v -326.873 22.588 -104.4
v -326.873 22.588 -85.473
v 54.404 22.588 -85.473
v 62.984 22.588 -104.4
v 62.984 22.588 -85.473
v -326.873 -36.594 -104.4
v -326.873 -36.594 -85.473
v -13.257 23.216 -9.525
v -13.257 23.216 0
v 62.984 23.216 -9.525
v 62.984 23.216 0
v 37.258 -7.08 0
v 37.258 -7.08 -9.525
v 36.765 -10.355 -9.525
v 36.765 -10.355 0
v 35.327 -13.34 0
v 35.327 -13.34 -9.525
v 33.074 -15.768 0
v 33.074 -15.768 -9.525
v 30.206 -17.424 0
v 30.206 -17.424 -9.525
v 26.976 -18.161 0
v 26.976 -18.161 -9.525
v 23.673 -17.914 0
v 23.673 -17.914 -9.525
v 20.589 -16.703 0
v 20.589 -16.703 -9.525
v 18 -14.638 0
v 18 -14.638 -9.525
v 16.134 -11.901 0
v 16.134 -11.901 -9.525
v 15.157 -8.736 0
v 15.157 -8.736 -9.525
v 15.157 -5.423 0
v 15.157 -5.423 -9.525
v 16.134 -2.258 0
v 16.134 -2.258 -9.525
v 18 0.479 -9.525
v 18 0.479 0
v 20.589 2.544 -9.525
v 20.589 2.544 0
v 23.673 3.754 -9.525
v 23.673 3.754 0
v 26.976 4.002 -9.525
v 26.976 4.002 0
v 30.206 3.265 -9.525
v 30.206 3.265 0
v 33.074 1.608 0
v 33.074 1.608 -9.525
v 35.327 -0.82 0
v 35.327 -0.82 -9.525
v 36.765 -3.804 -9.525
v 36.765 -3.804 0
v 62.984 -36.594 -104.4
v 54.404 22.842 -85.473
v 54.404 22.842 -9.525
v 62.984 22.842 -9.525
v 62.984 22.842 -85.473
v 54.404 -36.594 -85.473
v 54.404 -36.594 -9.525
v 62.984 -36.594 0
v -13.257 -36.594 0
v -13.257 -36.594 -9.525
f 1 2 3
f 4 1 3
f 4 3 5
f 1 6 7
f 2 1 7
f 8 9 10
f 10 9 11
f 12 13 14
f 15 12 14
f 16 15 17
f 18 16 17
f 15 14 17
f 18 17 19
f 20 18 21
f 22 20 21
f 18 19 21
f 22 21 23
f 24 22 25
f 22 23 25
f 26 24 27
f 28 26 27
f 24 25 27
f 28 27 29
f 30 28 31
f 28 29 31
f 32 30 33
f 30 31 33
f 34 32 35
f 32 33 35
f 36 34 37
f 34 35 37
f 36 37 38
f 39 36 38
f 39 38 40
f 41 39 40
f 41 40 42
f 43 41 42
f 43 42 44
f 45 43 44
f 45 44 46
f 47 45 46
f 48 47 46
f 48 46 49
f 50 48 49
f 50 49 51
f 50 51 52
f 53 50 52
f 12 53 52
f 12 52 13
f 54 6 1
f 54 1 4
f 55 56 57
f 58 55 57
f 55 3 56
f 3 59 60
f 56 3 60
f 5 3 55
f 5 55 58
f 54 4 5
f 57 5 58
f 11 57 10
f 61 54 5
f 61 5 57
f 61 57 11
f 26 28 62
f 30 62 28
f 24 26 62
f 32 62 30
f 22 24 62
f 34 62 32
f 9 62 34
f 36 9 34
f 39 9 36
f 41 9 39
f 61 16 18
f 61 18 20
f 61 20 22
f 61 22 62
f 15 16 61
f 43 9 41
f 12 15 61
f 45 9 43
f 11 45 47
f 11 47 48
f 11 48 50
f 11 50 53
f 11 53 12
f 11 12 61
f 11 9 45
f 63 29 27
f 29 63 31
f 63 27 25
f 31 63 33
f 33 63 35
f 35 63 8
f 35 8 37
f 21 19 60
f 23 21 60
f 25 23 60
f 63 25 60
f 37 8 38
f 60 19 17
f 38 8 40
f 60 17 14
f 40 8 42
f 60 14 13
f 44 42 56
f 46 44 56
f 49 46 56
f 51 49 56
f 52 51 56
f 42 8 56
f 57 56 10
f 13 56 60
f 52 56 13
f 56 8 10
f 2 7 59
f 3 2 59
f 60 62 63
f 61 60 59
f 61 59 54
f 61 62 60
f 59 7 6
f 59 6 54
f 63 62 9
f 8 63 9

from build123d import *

# Parameters (mm, degrees)
F0_W     = 76.2404734269
F0_H     = 59.8093401641
F1_DEPTH = 9.525
F2_W     = 8.5795149207
F2_H     = 75.9475912213
F3_DEPTH = 59.436
F4_W     = 389.8571208119
F4_H     = 18.9275667071
F5_DEPTH = 59.182
F7_D     = 22.225
F7_DEPTH = 9.526


with BuildPart() as f1:
    # F0 (on Top) → F1 (new body)
    with BuildSketch(Plane.XY):
        with Locations((24.8636114411, -6.689065136)):
            Rectangle(F0_W, F0_H)
    extrude(amount=-F1_DEPTH)

    # F2 (on face) → F3 (join)
    with BuildSketch(Plane.XZ.offset(36.593735218)):
        with Locations((58.6940906942, -47.4987956107)):
            Rectangle(F2_W, F2_H)
    extrude(amount=-F3_DEPTH)

    # F4 (on face) → F5 (join)
    with BuildSketch(Plane.XZ.offset(36.593735218)):
        with Locations((-131.9447122514, -94.9363745749)):
            Rectangle(F4_W, F4_H)
    extrude(amount=-F5_DEPTH)

    # F7 (through all, one way)
    with BuildSketch(Plane(origin=(0, 0, -9.525), x_dir=(1, 0, 0), z_dir=(0, 0, -1))):
        with Locations((26.1457208544, 7.0796483196)):
            Circle(F7_D / 2)
    extrude(amount=-F7_DEPTH, mode=Mode.SUBTRACT)


solid = f1.part
